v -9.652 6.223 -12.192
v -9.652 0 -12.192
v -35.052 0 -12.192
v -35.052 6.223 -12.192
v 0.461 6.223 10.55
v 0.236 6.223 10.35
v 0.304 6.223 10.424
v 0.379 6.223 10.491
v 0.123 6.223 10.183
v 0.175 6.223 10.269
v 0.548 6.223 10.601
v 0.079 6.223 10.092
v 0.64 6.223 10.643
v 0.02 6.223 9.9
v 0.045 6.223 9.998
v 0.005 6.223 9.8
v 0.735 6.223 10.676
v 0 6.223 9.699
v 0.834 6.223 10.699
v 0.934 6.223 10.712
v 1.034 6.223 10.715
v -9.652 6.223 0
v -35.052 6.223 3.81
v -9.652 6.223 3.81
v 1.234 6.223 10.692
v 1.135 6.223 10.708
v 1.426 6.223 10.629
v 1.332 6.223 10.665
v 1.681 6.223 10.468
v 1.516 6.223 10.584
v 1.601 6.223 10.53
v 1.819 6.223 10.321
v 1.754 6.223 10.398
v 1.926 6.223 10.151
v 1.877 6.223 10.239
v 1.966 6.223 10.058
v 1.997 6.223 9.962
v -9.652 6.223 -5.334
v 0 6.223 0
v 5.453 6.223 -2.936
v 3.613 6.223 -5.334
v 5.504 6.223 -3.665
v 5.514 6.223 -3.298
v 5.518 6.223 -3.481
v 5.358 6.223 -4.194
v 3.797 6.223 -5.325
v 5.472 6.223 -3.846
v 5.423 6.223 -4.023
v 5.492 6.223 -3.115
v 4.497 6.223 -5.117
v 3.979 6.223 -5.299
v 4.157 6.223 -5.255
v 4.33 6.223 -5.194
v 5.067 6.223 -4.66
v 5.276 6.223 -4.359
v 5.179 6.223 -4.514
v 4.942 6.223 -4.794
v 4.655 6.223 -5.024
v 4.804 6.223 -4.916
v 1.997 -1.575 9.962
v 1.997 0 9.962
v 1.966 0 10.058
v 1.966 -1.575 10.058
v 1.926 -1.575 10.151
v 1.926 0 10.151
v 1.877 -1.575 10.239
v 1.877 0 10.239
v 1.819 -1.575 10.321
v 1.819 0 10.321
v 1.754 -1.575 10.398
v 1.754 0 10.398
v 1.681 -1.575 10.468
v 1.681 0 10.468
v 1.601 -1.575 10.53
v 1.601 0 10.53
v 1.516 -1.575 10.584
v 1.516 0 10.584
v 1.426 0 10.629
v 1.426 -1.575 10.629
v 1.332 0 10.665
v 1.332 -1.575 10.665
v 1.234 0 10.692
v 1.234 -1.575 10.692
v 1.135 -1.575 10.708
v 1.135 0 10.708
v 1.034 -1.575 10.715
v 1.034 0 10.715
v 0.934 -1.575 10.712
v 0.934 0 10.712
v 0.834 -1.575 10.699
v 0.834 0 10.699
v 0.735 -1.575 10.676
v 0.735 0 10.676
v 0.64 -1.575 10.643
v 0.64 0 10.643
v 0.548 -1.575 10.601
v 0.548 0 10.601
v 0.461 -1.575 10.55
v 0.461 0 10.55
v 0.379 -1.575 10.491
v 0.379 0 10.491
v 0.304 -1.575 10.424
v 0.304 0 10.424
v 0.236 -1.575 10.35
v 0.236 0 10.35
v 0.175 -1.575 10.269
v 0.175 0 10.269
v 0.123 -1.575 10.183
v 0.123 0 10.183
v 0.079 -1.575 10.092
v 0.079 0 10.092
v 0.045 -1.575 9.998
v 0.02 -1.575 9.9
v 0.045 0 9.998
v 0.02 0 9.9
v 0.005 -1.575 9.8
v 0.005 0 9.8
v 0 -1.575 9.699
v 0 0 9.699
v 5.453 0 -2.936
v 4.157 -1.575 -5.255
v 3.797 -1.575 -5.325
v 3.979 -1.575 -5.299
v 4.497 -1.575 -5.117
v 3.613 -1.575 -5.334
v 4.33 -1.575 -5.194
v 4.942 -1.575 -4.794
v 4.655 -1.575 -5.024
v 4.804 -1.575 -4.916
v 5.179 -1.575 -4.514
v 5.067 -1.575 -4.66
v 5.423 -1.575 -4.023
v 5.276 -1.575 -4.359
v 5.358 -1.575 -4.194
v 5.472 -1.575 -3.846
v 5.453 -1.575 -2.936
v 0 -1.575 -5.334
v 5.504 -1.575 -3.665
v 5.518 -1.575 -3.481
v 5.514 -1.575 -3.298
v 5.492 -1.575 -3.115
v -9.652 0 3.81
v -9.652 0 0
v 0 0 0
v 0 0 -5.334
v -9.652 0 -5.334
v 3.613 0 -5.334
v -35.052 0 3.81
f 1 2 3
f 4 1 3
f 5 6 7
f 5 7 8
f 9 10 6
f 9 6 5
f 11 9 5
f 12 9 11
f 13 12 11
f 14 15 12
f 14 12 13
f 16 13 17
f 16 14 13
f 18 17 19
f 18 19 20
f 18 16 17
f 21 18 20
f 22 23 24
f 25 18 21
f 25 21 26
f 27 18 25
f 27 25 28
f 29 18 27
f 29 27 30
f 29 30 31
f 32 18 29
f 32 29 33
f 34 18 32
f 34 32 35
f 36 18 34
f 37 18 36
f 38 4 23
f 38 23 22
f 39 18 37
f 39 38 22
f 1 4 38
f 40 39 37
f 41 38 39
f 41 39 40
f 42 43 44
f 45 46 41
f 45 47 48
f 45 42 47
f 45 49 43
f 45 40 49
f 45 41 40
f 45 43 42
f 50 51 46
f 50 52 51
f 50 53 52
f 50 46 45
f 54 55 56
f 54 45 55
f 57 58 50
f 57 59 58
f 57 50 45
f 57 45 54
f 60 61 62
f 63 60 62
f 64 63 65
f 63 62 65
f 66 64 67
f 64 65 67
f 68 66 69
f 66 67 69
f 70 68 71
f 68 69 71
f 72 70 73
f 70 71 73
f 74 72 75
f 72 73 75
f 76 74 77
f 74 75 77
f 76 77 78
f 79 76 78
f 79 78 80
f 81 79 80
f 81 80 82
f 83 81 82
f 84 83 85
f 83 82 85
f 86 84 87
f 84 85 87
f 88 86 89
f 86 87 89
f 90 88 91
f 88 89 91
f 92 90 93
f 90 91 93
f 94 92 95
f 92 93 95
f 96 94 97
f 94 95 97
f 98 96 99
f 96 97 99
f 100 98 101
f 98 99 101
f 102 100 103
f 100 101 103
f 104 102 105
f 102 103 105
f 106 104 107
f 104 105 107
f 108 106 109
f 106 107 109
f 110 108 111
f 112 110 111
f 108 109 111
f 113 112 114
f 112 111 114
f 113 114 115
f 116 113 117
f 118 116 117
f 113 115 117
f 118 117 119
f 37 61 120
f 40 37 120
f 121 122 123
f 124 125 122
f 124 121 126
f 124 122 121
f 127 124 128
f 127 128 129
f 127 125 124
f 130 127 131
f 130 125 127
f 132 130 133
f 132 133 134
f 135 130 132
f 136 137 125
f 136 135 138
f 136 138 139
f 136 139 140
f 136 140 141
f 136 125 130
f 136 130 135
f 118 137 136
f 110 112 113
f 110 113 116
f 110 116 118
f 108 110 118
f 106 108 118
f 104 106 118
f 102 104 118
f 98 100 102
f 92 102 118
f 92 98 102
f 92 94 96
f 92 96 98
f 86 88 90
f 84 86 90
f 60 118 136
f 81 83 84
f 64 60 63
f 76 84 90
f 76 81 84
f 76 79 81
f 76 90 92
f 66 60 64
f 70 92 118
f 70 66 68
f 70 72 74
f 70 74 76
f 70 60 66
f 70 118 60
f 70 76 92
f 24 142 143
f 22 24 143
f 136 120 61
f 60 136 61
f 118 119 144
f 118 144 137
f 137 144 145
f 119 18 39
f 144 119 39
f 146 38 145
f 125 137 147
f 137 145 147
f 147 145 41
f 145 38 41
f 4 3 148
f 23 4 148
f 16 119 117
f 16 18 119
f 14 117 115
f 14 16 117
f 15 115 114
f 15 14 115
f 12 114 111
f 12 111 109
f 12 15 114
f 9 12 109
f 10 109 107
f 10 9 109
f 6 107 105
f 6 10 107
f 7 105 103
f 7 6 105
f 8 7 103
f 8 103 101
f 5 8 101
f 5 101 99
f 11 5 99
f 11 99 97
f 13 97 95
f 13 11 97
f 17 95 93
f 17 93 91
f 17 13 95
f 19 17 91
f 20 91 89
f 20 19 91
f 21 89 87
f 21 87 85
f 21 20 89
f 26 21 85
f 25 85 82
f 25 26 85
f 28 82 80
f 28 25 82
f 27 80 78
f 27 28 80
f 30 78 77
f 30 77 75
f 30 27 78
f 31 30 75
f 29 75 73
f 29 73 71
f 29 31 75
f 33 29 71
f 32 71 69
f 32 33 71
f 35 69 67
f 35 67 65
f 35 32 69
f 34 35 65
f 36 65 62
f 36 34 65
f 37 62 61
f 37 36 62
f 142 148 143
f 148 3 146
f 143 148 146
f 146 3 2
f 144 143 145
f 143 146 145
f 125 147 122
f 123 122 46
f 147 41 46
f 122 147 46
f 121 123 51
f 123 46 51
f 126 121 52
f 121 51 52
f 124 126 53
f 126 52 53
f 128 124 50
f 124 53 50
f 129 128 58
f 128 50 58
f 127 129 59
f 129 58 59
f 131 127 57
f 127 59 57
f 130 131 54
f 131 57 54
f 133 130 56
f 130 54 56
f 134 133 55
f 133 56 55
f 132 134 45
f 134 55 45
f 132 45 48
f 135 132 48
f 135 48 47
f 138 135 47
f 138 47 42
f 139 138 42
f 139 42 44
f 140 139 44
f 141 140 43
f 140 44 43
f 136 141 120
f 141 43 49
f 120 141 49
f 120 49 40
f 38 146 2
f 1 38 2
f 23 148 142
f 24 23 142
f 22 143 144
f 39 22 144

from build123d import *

# Parameters (mm, degrees)
SKETCH2_W           = 9.652
SKETCH2_H           = 5.334
BOSS_EXTRUDE1_DEPTH = 6.223
FILLET1_R           = 1.016
BOSS_EXTRUDE2_DEPTH = 1.5748
FILLET2_R           = 1.905


with BuildPart() as part:
    # Sketch2 → Boss-Extrude1 (new body)
    with BuildSketch(Plane(origin=(0, 0, 0), x_dir=(1, 0, 0), z_dir=(0, 1, 0))):
        Polygon((-9.652, 0), (-9.652, 5.334), (-9.652, 12.192), (-35.052, 12.192), (-35.052, -3.81), (-9.652, -3.81), align=None)
        with Locations((-4.826, 2.667)):
            Rectangle(SKETCH2_W, SKETCH2_H)
        Polygon((0, -17.416581723), (6.096, 5.334), (0, 5.334), (0, 0), align=None)
    extrude(amount=BOSS_EXTRUDE1_DEPTH)

    # Fillet1
    fillet1_edges = [part.edges().sort_by_distance(p)[0] for p in [
        (0, 3.1115, 17.416581723),
    ]]
    fillet(fillet1_edges, radius=FILLET1_R)

    # Sketch3 → Boss-Extrude2 (add)
    with BuildSketch(Plane.XZ):
        with BuildLine():
            Line((0, 9.699295544), (0, 0))
            Line((0, 0), (0, -5.334))
            Line((0, -5.334), (6.096, -5.334))
            Line((6.096, -5.334), (1.99738064, 9.962255694))
            ThreePointArc((1.99738064, 9.962255694), (0.883385389, 10.706603524), (0, 9.699295544))
        make_face()
    extrude(amount=BOSS_EXTRUDE2_DEPTH)

    # Fillet2
    fillet2_edges = [part.edges().sort_by_distance(p)[0] for p in [
        (6.096, 2.3241, -5.334),
    ]]
    fillet(fillet2_edges, radius=FILLET2_R)


solid = part.part
